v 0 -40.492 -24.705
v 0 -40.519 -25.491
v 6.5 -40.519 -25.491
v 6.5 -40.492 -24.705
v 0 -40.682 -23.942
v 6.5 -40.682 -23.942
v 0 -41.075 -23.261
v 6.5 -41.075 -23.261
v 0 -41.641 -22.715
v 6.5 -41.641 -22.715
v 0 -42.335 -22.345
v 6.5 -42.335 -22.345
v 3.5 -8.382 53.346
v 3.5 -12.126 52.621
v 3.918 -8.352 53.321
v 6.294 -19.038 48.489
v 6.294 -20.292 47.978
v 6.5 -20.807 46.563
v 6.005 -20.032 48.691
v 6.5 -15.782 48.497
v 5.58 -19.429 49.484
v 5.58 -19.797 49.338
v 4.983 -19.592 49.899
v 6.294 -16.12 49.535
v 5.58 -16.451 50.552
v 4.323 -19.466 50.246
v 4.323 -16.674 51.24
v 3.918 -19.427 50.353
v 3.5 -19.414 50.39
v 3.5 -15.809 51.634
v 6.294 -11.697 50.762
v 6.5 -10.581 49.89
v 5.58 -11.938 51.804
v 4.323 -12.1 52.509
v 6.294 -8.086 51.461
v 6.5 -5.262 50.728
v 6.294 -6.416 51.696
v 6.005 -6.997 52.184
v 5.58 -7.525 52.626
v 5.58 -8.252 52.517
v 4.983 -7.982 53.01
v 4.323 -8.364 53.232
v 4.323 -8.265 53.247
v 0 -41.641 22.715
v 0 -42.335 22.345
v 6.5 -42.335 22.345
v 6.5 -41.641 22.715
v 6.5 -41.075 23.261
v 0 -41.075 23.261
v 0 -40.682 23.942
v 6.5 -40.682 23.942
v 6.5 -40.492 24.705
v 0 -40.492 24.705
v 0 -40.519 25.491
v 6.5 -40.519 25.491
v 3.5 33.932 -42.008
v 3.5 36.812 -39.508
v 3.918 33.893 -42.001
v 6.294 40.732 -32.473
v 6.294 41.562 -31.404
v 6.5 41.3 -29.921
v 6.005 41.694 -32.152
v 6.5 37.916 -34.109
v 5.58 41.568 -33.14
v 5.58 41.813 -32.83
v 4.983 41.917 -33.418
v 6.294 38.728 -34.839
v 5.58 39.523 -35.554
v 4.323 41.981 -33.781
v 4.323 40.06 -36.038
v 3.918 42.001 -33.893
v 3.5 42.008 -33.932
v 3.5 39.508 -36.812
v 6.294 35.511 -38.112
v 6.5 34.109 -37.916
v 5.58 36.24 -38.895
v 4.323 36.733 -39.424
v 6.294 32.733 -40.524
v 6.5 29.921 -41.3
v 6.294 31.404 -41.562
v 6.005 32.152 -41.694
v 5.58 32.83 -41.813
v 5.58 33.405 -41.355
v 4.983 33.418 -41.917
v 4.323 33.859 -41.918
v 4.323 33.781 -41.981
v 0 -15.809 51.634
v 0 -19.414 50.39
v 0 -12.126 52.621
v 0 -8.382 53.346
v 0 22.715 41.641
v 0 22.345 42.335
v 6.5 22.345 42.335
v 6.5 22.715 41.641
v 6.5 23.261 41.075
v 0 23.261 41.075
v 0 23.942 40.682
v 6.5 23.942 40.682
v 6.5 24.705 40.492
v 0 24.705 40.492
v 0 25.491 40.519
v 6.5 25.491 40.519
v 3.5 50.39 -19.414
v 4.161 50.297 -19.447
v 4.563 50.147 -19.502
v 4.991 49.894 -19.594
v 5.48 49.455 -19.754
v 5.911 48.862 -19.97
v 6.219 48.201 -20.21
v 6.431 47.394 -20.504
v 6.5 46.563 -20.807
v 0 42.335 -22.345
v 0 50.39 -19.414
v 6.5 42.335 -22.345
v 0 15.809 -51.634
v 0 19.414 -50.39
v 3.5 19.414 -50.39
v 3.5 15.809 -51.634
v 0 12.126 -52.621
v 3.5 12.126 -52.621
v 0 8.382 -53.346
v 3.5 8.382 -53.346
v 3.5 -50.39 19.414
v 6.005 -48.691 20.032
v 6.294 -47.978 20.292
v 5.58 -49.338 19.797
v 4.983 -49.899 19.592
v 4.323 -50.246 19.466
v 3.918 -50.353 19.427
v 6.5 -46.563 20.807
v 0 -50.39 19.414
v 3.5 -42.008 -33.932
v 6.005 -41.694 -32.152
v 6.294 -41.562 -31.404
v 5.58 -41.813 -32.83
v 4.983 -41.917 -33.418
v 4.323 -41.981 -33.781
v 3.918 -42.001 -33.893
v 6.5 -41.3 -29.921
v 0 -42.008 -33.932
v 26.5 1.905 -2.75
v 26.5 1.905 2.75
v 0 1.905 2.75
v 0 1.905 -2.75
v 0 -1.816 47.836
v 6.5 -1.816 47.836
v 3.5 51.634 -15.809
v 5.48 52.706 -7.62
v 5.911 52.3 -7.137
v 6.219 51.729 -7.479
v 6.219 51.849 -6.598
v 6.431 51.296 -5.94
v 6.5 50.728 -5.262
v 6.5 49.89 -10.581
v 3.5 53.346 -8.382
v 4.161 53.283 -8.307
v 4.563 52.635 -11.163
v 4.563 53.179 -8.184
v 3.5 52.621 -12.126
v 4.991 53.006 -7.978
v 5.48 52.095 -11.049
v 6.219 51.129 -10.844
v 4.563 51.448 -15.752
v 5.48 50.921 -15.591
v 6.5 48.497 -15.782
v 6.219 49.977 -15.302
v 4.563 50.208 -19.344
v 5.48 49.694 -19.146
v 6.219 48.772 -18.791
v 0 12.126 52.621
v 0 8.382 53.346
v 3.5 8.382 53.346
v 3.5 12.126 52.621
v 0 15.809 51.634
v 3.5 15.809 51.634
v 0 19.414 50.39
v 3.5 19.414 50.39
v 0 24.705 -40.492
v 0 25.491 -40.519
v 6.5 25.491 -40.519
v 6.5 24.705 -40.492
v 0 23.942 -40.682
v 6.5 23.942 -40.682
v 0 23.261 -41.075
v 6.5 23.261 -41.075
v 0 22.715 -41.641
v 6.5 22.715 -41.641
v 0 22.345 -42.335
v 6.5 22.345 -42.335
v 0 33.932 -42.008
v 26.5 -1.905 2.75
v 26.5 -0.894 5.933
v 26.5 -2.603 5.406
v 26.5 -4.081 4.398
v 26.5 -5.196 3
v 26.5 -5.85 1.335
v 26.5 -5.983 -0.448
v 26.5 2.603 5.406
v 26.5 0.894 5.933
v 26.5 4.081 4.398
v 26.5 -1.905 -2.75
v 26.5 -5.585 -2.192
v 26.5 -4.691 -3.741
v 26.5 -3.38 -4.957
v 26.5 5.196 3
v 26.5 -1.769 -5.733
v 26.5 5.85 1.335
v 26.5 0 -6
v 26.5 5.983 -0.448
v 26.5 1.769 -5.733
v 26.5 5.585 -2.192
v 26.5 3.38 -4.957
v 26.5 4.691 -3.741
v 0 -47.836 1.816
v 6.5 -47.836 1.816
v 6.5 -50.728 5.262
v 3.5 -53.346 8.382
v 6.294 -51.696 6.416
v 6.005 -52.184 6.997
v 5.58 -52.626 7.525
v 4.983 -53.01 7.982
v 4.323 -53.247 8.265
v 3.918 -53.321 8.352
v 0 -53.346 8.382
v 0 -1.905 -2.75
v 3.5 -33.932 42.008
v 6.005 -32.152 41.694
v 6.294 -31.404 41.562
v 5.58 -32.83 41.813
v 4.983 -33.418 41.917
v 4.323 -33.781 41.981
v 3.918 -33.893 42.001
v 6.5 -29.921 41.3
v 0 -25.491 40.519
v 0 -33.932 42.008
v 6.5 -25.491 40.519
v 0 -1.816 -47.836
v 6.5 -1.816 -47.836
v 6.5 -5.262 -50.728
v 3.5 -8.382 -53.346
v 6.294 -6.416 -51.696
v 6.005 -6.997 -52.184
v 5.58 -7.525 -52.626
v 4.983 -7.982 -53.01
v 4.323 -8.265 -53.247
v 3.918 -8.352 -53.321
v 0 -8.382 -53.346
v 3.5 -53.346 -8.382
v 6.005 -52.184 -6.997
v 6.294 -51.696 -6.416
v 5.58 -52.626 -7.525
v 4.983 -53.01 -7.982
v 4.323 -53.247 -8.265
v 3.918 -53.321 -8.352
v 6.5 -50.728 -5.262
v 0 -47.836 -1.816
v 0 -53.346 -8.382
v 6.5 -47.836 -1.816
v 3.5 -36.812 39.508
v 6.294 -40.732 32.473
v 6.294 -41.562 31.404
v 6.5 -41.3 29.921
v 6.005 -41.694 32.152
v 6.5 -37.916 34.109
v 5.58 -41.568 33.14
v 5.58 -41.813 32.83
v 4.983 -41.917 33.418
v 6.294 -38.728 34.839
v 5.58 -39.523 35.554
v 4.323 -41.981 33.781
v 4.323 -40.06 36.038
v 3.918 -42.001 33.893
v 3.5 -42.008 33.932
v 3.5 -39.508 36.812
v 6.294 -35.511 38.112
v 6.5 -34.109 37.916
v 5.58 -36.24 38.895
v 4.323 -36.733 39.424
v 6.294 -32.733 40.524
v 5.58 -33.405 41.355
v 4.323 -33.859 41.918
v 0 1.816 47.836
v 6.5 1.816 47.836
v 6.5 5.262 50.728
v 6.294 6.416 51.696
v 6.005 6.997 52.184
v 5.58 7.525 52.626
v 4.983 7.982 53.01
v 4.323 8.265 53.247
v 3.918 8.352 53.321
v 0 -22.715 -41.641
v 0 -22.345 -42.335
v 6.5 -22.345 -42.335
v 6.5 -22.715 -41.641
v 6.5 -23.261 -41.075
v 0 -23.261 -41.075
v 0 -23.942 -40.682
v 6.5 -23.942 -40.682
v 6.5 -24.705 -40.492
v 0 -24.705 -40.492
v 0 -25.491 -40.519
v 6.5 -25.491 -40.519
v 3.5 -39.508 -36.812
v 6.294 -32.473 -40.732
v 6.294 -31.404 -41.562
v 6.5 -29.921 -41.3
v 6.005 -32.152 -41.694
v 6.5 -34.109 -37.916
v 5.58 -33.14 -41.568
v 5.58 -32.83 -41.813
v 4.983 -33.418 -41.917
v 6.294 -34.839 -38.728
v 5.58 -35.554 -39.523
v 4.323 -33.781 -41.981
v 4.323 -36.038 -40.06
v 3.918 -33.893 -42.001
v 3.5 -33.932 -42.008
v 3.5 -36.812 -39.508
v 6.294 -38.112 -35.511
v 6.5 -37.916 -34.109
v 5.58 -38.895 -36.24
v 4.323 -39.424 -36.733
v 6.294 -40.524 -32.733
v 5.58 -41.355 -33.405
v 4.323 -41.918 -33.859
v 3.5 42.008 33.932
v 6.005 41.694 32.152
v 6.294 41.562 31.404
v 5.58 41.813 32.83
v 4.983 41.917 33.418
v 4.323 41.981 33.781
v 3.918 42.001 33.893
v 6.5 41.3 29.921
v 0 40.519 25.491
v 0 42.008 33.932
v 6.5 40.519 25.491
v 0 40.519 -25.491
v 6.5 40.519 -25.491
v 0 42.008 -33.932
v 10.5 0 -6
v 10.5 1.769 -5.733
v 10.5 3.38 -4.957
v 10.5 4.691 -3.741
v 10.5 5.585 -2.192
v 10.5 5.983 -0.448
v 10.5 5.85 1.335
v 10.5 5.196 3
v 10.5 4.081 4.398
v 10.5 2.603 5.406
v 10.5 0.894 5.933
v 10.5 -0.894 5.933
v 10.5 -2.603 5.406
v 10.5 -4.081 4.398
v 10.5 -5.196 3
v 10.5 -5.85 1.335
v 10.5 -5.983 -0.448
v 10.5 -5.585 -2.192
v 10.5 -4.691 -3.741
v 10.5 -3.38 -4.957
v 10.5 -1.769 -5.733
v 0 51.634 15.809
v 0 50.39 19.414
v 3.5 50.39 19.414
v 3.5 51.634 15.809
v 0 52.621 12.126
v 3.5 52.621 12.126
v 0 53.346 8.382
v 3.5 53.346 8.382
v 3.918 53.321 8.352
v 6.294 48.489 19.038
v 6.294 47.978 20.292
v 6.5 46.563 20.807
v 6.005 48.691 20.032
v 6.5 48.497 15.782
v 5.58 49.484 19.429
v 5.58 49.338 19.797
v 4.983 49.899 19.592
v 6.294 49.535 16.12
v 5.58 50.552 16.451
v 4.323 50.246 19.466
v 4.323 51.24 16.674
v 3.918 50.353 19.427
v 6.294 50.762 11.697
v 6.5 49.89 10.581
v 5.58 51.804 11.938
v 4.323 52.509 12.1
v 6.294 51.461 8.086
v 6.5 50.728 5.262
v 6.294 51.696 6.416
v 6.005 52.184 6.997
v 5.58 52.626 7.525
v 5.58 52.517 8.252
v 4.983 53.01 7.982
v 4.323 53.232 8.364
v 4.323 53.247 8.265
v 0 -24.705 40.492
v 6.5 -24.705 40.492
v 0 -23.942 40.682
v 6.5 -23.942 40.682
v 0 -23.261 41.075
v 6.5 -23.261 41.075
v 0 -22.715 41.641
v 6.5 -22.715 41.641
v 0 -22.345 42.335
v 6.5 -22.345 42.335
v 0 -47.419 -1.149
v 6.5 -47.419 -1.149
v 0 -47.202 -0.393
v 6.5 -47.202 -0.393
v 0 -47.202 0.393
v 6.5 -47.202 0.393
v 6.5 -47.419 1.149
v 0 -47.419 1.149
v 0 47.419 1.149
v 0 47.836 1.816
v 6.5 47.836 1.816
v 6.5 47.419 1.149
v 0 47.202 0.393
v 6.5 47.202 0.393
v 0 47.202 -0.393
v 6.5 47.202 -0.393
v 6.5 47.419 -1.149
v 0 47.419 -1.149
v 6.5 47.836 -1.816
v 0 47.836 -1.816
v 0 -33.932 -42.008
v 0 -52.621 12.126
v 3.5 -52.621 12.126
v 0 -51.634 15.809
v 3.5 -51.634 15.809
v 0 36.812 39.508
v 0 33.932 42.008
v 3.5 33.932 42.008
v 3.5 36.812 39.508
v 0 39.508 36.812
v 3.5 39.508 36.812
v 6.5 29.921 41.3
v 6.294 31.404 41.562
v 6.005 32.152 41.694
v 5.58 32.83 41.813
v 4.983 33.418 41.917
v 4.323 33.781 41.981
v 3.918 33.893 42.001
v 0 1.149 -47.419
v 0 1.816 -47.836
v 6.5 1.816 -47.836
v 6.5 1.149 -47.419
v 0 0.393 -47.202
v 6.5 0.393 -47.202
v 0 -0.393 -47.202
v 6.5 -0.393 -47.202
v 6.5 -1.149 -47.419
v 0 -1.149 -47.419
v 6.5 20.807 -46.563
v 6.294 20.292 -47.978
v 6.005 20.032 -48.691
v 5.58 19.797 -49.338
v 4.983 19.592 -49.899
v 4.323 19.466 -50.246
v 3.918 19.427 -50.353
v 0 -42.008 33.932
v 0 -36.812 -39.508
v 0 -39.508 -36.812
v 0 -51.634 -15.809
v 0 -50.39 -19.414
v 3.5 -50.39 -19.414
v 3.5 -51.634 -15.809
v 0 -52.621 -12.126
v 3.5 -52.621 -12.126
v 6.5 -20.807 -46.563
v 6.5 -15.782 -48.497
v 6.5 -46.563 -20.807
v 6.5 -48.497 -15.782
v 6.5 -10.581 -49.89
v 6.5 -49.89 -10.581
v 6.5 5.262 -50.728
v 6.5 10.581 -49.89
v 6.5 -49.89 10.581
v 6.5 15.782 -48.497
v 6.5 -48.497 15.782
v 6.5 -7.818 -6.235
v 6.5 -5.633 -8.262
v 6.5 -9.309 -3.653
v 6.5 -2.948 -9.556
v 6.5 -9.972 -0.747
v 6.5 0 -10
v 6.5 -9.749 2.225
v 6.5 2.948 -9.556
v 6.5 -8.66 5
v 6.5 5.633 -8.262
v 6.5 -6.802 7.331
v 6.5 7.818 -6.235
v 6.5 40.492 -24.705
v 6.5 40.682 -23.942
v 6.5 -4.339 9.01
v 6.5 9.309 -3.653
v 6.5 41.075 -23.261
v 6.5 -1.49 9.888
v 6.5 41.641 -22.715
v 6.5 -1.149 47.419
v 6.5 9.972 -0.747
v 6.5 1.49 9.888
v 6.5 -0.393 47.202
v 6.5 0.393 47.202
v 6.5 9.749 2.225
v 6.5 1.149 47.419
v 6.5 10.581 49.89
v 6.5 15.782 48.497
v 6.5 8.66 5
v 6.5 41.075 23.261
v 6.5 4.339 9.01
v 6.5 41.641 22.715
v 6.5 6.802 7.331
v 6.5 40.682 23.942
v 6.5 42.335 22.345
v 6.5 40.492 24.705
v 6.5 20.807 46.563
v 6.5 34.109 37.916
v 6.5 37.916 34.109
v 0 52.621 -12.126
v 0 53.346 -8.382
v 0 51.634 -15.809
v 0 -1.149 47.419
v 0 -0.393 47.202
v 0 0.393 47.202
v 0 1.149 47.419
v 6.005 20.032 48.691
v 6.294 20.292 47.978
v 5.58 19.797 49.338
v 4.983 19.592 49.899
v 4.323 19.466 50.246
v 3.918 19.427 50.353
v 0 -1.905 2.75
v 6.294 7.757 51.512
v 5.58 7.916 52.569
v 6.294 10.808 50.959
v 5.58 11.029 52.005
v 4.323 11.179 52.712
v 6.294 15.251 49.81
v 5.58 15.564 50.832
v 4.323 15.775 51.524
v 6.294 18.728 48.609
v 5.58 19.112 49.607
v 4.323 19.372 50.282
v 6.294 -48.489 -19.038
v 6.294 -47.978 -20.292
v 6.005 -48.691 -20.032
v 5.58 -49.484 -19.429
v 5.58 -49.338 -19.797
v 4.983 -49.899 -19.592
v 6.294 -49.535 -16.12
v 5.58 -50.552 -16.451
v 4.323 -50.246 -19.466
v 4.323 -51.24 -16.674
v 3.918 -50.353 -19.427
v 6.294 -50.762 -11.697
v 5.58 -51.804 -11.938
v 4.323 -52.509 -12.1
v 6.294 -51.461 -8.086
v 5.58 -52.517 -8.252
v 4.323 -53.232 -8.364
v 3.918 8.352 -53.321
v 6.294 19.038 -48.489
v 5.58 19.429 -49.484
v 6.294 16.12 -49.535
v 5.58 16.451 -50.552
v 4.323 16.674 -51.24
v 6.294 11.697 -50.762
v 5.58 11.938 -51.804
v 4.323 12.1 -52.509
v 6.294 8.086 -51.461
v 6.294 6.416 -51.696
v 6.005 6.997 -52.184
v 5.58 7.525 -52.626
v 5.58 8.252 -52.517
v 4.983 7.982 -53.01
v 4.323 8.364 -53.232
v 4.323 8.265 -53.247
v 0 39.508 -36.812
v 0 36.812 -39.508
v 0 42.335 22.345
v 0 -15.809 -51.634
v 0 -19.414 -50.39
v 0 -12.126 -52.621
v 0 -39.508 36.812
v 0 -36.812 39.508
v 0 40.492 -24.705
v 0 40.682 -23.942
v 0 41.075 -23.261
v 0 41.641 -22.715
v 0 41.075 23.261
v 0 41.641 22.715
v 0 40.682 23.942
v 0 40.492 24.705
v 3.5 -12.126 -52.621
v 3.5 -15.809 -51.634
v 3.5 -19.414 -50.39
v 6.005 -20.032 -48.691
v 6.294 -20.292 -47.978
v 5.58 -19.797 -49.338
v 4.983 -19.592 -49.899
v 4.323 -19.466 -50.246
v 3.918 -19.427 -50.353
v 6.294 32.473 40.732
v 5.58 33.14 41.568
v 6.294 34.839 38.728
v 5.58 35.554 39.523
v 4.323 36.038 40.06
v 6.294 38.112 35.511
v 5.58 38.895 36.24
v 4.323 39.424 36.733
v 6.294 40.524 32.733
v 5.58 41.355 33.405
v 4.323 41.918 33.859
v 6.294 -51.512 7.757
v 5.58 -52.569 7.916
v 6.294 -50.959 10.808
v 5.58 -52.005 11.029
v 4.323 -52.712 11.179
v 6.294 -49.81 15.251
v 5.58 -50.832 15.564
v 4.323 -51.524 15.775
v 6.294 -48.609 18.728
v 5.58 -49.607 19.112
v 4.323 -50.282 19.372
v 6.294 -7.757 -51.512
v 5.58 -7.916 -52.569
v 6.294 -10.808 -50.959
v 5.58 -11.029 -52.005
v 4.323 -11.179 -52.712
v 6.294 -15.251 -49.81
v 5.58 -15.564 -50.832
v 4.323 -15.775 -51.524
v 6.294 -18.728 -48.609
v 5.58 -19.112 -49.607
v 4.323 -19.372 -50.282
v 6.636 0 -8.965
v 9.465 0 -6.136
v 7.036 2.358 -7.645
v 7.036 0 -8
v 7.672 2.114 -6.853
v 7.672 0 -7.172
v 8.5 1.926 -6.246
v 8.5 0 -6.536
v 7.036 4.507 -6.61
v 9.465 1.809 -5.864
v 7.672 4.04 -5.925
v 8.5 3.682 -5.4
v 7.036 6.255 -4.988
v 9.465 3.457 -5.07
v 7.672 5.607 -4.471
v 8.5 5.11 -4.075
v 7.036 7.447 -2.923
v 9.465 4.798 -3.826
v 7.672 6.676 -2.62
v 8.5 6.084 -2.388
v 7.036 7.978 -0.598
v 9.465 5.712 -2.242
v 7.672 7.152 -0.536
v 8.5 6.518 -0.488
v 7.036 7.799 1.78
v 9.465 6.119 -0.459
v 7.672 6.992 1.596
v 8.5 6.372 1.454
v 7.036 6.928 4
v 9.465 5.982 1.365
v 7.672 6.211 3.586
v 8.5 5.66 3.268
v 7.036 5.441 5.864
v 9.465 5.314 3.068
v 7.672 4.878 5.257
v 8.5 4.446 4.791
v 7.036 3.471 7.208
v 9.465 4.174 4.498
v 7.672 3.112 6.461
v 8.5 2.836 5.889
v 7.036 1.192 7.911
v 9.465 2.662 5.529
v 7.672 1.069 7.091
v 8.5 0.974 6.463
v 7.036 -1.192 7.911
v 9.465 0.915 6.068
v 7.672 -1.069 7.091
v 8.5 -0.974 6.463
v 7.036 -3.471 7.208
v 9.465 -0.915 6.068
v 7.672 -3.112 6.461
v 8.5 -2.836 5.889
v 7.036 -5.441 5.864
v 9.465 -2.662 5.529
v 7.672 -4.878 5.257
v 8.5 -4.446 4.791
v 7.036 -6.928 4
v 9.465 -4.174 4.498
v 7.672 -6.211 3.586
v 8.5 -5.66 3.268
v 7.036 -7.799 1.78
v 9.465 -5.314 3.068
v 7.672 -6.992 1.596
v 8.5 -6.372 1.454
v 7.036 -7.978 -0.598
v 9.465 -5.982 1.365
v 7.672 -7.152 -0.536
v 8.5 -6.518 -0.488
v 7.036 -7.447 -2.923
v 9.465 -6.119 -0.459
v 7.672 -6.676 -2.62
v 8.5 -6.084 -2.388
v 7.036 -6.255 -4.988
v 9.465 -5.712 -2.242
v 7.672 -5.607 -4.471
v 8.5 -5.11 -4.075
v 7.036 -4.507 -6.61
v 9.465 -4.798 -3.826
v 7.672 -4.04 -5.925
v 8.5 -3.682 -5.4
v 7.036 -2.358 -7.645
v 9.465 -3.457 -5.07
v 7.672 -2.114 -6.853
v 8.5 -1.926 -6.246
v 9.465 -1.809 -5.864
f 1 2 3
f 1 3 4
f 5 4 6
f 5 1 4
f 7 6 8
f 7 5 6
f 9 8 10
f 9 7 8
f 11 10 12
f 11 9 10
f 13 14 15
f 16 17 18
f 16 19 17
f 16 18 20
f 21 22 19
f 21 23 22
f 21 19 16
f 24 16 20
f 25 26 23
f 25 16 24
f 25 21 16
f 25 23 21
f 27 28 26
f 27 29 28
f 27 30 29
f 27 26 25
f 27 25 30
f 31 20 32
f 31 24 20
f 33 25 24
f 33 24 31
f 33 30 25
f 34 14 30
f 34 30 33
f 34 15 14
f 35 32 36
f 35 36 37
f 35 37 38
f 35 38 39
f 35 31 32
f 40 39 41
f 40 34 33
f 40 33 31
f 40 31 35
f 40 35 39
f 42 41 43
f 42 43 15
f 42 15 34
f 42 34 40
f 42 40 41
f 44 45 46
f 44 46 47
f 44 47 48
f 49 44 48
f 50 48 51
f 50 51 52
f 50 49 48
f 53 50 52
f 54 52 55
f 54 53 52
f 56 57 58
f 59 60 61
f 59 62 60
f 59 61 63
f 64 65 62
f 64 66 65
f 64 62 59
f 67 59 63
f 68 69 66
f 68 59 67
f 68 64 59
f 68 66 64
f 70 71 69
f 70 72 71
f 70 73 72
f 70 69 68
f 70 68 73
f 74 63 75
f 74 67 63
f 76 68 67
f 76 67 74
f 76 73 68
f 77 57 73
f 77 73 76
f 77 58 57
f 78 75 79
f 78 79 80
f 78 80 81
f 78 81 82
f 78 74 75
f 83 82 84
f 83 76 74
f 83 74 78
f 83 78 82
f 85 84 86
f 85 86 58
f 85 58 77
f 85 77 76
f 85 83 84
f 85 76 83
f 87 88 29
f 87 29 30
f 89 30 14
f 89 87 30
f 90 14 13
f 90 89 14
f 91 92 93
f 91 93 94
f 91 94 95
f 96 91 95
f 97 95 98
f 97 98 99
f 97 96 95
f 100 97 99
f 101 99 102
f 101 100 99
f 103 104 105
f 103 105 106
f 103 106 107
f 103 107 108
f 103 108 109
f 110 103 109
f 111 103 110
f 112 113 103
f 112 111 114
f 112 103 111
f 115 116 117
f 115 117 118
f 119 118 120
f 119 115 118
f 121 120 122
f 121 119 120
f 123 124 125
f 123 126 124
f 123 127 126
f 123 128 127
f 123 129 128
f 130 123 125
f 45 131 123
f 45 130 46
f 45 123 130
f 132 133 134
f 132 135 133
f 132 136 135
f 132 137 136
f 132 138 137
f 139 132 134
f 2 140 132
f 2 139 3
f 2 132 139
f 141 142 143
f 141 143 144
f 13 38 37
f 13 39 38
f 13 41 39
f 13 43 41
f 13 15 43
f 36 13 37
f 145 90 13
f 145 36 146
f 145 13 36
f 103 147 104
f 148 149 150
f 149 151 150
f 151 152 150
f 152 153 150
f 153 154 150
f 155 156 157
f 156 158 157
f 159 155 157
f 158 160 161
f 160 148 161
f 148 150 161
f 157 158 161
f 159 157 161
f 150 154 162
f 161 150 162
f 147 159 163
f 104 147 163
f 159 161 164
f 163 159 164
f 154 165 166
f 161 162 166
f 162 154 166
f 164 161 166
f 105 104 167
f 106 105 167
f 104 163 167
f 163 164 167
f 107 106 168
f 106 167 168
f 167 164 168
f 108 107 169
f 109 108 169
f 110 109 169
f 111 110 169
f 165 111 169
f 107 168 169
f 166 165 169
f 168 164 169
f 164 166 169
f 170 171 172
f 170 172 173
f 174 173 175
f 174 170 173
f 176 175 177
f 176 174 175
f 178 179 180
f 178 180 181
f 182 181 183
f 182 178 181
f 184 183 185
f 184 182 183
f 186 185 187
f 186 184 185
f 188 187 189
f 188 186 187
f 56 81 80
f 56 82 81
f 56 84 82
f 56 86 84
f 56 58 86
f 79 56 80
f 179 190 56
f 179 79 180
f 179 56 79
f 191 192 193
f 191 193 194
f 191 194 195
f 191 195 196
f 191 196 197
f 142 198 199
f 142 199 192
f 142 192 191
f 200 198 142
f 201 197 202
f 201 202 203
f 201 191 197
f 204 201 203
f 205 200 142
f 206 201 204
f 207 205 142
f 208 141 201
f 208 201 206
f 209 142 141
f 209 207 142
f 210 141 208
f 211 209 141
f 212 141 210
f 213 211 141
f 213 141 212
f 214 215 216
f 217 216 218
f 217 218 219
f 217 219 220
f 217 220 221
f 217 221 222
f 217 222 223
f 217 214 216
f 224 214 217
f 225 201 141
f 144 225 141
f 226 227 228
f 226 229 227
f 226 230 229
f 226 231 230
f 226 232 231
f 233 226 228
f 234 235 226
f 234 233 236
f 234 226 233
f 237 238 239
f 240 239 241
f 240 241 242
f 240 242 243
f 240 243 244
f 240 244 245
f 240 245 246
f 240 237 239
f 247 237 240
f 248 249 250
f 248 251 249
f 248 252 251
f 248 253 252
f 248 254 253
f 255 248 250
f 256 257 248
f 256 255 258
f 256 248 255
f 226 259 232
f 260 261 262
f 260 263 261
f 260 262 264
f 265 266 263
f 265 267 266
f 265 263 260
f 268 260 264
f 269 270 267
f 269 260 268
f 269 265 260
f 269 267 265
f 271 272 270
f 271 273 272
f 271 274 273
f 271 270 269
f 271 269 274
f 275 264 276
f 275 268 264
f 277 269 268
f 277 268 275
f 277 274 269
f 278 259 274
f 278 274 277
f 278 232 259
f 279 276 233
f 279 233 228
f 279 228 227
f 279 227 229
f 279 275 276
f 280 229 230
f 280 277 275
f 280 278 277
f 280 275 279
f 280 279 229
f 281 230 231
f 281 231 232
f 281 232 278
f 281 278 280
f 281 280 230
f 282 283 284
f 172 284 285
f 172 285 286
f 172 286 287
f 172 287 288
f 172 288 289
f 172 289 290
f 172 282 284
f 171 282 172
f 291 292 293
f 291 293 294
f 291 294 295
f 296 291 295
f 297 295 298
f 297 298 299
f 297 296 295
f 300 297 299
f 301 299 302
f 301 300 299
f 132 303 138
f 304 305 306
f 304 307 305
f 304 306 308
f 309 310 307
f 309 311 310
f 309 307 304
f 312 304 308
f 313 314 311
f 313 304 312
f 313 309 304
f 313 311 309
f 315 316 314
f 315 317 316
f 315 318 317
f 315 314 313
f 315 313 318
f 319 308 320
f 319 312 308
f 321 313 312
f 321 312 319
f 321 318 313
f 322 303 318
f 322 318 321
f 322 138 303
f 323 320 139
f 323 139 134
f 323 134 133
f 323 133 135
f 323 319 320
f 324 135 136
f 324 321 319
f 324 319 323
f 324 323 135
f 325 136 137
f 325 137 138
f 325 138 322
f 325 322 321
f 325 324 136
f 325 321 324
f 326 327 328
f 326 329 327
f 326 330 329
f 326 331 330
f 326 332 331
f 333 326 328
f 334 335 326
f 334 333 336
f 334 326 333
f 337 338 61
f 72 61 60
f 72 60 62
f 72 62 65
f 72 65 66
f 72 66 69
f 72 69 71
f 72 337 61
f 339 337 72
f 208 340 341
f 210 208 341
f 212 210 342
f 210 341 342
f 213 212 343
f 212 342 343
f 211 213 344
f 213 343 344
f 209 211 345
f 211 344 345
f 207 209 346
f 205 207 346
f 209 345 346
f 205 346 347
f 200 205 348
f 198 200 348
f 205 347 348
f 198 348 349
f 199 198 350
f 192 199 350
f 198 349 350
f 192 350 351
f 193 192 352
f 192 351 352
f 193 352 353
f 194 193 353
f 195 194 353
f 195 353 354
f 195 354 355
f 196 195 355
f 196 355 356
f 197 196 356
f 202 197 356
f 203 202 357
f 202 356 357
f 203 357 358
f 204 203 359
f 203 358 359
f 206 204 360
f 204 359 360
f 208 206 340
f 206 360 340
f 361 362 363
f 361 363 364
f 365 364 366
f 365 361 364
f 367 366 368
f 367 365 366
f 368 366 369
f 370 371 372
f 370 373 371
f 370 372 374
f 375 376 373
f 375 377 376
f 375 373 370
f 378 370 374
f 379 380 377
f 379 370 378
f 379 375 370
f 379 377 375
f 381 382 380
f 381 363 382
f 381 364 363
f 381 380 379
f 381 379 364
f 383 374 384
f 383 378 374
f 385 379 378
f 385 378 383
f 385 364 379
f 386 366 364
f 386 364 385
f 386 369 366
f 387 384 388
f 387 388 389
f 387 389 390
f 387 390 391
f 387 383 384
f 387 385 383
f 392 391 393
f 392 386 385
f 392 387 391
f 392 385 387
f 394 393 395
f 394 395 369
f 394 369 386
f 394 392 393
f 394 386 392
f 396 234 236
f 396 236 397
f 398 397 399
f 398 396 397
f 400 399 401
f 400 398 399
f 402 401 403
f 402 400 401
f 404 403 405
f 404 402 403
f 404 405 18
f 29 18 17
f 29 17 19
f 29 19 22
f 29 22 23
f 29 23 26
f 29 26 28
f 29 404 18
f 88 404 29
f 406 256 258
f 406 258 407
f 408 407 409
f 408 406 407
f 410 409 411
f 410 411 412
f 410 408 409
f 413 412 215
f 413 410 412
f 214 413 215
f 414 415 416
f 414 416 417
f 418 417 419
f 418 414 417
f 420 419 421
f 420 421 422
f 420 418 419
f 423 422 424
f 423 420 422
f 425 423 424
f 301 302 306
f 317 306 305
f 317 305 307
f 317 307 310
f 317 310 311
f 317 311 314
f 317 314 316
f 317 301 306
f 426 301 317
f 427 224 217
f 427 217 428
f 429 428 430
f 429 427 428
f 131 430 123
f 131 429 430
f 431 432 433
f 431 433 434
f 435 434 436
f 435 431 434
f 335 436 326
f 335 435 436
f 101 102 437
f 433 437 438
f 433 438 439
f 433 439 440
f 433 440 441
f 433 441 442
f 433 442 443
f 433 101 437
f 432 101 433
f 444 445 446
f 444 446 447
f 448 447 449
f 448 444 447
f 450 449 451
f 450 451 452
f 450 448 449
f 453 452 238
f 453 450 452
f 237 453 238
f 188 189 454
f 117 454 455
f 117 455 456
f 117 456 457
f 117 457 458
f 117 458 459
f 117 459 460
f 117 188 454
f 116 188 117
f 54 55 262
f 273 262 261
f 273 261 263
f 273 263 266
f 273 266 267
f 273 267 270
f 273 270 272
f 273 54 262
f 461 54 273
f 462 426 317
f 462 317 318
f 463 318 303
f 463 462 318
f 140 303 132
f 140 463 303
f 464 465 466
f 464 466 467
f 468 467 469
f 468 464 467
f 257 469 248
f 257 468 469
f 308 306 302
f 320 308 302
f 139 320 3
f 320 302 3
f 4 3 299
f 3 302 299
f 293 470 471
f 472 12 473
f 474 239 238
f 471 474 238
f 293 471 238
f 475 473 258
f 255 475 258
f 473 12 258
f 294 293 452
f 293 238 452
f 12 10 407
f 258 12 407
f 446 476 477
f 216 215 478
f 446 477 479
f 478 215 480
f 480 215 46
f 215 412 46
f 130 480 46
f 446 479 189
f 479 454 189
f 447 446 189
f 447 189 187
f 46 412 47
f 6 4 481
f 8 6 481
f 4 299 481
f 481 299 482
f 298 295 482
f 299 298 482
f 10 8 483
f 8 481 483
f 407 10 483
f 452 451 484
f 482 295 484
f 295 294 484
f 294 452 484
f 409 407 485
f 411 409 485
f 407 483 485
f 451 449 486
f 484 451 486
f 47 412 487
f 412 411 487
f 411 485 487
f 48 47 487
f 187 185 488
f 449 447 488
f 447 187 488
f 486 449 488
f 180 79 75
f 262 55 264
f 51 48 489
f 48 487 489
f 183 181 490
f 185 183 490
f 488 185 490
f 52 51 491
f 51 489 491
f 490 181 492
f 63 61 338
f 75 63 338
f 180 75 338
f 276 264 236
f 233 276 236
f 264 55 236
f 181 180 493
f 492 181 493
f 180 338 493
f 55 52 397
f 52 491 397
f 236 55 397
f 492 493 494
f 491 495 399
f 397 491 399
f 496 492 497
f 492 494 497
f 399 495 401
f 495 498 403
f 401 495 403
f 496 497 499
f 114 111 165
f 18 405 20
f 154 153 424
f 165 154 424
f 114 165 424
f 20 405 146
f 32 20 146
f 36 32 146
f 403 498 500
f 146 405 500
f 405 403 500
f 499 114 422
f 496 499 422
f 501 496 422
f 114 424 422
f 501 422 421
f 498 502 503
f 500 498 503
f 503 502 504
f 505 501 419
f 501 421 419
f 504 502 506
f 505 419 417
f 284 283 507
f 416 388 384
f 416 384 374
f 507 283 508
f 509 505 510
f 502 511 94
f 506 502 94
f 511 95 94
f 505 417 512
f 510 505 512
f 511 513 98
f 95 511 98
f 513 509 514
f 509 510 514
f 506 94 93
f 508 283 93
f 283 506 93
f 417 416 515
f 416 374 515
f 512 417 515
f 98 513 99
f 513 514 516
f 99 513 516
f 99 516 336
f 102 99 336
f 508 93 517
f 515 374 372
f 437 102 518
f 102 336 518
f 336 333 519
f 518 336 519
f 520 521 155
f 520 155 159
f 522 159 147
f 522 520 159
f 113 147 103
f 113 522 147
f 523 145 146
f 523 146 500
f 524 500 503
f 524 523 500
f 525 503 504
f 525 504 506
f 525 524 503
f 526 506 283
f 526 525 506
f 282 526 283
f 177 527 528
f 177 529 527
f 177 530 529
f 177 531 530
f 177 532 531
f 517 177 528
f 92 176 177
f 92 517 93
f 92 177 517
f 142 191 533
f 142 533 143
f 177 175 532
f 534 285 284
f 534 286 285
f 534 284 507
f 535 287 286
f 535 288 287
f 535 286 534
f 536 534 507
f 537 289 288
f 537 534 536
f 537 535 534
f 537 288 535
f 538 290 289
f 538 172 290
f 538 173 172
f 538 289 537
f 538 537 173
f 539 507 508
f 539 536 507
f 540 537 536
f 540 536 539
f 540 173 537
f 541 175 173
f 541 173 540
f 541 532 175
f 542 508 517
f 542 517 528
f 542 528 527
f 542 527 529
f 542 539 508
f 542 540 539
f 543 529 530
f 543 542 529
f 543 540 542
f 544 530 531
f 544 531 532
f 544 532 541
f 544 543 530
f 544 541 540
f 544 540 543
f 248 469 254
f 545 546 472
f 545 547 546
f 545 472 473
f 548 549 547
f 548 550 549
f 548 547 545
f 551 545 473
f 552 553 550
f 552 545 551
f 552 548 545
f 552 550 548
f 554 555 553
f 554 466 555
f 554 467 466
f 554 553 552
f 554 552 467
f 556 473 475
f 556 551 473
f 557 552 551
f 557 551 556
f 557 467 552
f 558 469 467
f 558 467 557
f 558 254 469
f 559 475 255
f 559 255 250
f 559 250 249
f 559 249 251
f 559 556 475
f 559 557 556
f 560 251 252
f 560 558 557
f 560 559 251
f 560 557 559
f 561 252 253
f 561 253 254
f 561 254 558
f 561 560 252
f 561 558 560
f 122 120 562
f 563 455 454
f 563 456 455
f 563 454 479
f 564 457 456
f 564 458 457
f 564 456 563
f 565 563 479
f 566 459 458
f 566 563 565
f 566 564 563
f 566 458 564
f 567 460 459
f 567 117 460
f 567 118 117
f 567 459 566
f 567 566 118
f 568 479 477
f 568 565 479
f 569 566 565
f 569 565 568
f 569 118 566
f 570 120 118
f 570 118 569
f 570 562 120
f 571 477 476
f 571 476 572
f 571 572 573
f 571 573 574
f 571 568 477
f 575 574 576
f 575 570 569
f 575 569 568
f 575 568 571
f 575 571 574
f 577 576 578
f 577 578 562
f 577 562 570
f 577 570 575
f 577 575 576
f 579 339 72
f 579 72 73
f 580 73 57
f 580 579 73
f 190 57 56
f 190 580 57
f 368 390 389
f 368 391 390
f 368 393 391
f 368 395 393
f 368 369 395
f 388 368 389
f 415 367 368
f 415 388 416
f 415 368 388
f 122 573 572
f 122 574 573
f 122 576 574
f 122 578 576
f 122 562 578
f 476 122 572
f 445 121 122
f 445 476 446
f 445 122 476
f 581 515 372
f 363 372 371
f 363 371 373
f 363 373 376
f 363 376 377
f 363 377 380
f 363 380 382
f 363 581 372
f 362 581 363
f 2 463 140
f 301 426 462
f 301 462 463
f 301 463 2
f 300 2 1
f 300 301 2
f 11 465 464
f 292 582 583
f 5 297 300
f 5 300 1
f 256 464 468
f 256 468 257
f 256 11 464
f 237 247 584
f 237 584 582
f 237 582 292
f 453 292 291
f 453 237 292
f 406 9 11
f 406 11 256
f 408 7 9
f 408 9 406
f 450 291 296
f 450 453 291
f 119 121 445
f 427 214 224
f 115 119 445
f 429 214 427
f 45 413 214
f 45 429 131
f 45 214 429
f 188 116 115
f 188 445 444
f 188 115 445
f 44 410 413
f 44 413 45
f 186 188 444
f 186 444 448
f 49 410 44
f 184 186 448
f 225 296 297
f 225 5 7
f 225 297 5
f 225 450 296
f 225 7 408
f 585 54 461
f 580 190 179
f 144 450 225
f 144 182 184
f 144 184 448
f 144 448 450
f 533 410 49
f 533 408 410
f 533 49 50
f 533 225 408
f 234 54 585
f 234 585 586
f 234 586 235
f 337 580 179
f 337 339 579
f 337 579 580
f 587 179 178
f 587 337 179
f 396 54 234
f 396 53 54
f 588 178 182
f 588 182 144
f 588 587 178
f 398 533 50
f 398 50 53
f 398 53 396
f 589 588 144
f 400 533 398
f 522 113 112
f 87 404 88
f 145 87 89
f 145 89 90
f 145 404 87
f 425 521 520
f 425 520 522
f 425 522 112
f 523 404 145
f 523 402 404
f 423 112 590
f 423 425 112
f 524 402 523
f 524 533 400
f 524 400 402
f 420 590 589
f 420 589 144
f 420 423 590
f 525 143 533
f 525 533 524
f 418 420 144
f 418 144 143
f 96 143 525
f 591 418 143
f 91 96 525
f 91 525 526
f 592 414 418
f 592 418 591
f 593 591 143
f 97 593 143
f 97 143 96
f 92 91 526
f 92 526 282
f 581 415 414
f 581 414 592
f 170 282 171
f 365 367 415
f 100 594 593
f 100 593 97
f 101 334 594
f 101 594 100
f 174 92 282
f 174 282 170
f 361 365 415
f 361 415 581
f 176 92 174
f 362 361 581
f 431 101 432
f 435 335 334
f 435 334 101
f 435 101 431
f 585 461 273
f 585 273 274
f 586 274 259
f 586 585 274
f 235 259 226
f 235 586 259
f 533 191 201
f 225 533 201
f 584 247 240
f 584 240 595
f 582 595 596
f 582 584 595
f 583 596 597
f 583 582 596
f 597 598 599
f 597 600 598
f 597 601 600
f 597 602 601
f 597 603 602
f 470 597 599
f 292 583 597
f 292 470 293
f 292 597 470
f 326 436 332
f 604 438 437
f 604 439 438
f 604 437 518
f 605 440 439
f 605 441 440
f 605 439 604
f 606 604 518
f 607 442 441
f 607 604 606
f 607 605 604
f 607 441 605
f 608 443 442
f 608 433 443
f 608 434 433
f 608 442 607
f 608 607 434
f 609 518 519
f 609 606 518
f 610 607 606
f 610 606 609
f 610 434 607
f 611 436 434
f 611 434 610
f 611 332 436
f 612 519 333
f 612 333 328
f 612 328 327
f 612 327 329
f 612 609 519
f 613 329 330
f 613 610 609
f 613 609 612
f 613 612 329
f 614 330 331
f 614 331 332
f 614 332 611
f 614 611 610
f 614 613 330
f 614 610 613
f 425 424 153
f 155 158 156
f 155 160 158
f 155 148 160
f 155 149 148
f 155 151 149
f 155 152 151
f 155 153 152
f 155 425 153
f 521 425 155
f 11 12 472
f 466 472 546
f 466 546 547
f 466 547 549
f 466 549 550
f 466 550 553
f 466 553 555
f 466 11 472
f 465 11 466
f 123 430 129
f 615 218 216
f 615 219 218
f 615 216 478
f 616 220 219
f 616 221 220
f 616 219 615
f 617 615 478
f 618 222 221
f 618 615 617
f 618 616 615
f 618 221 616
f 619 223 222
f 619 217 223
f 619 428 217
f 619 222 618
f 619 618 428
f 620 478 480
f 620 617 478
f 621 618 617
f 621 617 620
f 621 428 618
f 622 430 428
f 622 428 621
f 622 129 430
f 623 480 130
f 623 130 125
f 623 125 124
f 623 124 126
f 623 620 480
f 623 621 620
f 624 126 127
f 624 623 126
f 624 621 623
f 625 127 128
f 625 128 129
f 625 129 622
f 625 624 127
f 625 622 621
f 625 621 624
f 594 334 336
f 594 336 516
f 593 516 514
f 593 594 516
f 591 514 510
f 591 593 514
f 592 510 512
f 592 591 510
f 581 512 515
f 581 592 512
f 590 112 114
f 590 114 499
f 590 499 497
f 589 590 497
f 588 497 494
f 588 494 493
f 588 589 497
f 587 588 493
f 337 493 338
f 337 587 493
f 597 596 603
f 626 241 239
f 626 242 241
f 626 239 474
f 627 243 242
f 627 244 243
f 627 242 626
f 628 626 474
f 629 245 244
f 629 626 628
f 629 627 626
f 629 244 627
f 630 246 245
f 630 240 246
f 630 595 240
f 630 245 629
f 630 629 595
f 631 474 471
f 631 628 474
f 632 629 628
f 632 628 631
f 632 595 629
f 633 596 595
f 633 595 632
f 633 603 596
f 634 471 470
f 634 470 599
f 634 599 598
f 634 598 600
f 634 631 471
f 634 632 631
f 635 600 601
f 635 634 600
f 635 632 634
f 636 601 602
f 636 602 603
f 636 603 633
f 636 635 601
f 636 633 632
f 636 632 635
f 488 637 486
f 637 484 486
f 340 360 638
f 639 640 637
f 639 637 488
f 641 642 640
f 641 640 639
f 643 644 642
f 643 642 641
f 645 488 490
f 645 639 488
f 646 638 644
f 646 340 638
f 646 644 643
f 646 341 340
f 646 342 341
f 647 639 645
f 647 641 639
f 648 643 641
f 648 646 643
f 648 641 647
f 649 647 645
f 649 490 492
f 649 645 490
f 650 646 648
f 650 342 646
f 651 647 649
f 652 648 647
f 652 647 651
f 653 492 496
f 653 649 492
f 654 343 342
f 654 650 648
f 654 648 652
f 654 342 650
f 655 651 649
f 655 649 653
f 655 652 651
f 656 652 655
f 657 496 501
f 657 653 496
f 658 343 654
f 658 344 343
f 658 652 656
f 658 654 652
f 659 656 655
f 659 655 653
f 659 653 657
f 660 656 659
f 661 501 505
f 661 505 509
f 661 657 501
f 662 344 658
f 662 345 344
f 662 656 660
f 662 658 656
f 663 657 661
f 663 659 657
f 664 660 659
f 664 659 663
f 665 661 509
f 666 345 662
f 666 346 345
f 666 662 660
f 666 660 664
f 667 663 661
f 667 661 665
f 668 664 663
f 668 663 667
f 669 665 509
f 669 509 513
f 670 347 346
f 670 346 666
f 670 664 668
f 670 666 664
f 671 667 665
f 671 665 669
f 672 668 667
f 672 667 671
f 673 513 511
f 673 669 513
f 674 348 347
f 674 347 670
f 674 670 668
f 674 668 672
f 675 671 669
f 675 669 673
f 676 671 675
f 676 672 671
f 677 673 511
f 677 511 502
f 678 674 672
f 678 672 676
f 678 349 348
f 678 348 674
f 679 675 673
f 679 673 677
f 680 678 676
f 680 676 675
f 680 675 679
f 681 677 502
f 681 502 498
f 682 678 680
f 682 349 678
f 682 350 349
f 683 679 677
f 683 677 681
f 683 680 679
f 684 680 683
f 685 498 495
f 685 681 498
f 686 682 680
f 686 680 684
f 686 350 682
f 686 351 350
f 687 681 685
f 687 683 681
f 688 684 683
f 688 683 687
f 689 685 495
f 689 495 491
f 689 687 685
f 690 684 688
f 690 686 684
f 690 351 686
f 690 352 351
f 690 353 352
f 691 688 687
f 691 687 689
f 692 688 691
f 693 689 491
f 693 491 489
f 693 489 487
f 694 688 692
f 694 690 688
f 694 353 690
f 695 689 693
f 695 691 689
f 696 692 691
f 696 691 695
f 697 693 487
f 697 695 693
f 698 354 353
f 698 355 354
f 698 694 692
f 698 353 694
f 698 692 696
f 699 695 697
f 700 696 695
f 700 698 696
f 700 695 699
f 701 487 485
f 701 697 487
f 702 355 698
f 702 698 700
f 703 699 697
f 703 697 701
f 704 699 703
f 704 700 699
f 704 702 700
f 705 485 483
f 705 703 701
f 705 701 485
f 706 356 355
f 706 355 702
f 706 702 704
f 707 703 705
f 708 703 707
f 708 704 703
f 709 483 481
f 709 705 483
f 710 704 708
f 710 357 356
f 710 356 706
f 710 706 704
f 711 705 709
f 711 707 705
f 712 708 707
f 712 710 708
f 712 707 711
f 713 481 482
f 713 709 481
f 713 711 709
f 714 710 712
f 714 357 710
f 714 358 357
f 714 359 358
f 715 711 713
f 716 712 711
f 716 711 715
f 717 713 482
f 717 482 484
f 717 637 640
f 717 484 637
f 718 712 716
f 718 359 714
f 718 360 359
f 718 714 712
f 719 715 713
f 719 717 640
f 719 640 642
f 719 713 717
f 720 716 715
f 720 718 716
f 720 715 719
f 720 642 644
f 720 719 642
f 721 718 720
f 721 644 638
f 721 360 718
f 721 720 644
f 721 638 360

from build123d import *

# Parameters (mm, degrees)
BOSS_EXTRUDE1_DEPTH = 6.5
SKETCH2_R           = 6
BOSS_EXTRUDE2_DEPTH = 20
FILLET1_R           = 3
SKETCH3_W           = 5.5
SKETCH3_H           = 3.81
CUT_EXTRUDE1_DEPTH  = 27.5000001
FILLET2_R           = 4


with BuildPart() as part:
    # Sketch1 → Boss-Extrude1 (new body)
    with BuildSketch(Plane(origin=(0, 0, 0), x_dir=(0, 0, -1), z_dir=(1, 0, 0))):
        with BuildLine():
            Line((1.815874997, 47.835924448), (8.381939498, 53.345506749))
            ThreePointArc((8.381939498, 53.345506749), (13.976228436, 52.15999462), (19.413780836, 50.389533771))
            Line((19.413780836, 50.389533771), (22.345368346, 42.335063284))
            ThreePointArc((22.345368346, 42.335063284), (23.5875, 40.854748424), (25.490556102, 40.519188287))
            Line((25.490556102, 40.519188287), (33.931725912, 42.007594273))
            ThreePointArc((33.931725912, 42.007594273), (38.183766184, 38.183766184), (42.007594273, 33.931725912))
            Line((42.007594273, 33.931725912), (40.519188287, 25.490556102))
            ThreePointArc((40.519188287, 25.490556102), (40.854748424, 23.5875), (42.335063284, 22.345368346))
            Line((42.335063284, 22.345368346), (50.389533771, 19.413780836))
            ThreePointArc((50.389533771, 19.413780836), (52.15999462, 13.976228436), (53.345506749, 8.381939498))
            Line((53.345506749, 8.381939498), (47.835924448, 1.815874997))
            ThreePointArc((47.835924448, 1.815874997), (47.175, 0), (47.835924448, -1.815874997))
            Line((47.835924448, -1.815874997), (53.345506749, -8.381939498))
            ThreePointArc((53.345506749, -8.381939498), (52.15999462, -13.976228436), (50.389533771, -19.413780836))
            Line((50.389533771, -19.413780836), (42.335063284, -22.345368346))
            ThreePointArc((42.335063284, -22.345368346), (40.854748424, -23.5875), (40.519188287, -25.490556102))
            Line((40.519188287, -25.490556102), (42.007594273, -33.931725912))
            ThreePointArc((42.007594273, -33.931725912), (38.183766184, -38.183766184), (33.931725912, -42.007594273))
            Line((33.931725912, -42.007594273), (25.490556102, -40.519188287))
            ThreePointArc((25.490556102, -40.519188287), (23.5875, -40.854748424), (22.345368346, -42.335063284))
            Line((22.345368346, -42.335063284), (19.413780836, -50.389533771))
            ThreePointArc((19.413780836, -50.389533771), (13.976228436, -52.15999462), (8.381939498, -53.345506749))
            Line((8.381939498, -53.345506749), (1.815874997, -47.835924448))
            ThreePointArc((1.815874997, -47.835924448), (0, -47.175), (-1.815874997, -47.835924448))
            Line((-1.815874997, -47.835924448), (-8.381939498, -53.345506749))
            ThreePointArc((-8.381939498, -53.345506749), (-13.976228436, -52.15999462), (-19.413780836, -50.389533771))
            Line((-19.413780836, -50.389533771), (-22.345368346, -42.335063284))
            ThreePointArc((-22.345368346, -42.335063284), (-23.5875, -40.854748424), (-25.490556102, -40.519188287))
            Line((-25.490556102, -40.519188287), (-33.931725912, -42.007594273))
            ThreePointArc((-33.931725912, -42.007594273), (-38.183766184, -38.183766184), (-42.007594273, -33.931725912))
            Line((-42.007594273, -33.931725912), (-40.519188287, -25.490556102))
            ThreePointArc((-40.519188287, -25.490556102), (-40.854748424, -23.5875), (-42.335063284, -22.345368346))
            Line((-42.335063284, -22.345368346), (-50.389533771, -19.413780836))
            ThreePointArc((-50.389533771, -19.413780836), (-52.15999462, -13.976228436), (-53.345506749, -8.381939498))
            Line((-53.345506749, -8.381939498), (-47.835924448, -1.815874997))
            ThreePointArc((-47.835924448, -1.815874997), (-47.175, 0), (-47.835924448, 1.815874997))
            Line((-47.835924448, 1.815874997), (-53.345506749, 8.381939498))
            ThreePointArc((-53.345506749, 8.381939498), (-52.15999462, 13.976228436), (-50.389533771, 19.413780836))
            Line((-50.389533771, 19.413780836), (-42.335063284, 22.345368346))
            ThreePointArc((-42.335063284, 22.345368346), (-40.854748424, 23.5875), (-40.519188287, 25.490556102))
            Line((-40.519188287, 25.490556102), (-42.007594273, 33.931725912))
            ThreePointArc((-42.007594273, 33.931725912), (-38.183766184, 38.183766184), (-33.931725912, 42.007594273))
            Line((-33.931725912, 42.007594273), (-25.490556102, 40.519188287))
            ThreePointArc((-25.490556102, 40.519188287), (-23.5875, 40.854748424), (-22.345368346, 42.335063284))
            Line((-22.345368346, 42.335063284), (-19.413780836, 50.389533771))
            ThreePointArc((-19.413780836, 50.389533771), (-13.976228436, 52.15999462), (-8.381939498, 53.345506749))
            Line((-8.381939498, 53.345506749), (-1.815874997, 47.835924448))
            ThreePointArc((-1.815874997, 47.835924448), (0, 47.175), (1.815874997, 47.835924448))
        make_face()
    extrude(amount=BOSS_EXTRUDE1_DEPTH)

    # Sketch2 → Boss-Extrude2 (add)
    with BuildSketch(Plane(origin=(6.5, 0, 0), x_dir=(0, 0, -1), z_dir=(1, 0, 0))):
        Circle(SKETCH2_R)
    extrude(amount=BOSS_EXTRUDE2_DEPTH)

    # Fillet1
    fillet1_edges = [part.edges().sort_by_distance(p)[0] for p in [
        (6.5, -52.15999462, 13.976228436),
        (6.5, -52.15999462, -13.976228436),
        (6.5, 52.15999462, -13.976228436),
        (6.5, -38.183766184, -38.183766184),
        (6.5, -13.976228436, -52.15999462),
        (6.5, 13.976228436, -52.15999462),
        (6.5, 38.183766184, -38.183766184),
        (6.5, 52.15999462, 13.976228436),
        (6.5, 38.183766184, 38.183766184),
        (6.5, 13.976228436, 52.15999462),
        (6.5, -13.976228436, 52.15999462),
        (6.5, -38.183766184, 38.183766184),
    ]]
    fillet(fillet1_edges, radius=FILLET1_R)

    # Sketch3 → Cut-Extrude1 (cut, through all)
    with BuildSketch(Plane(origin=(26.5, 0, 0), x_dir=(0, 0, -1), z_dir=(1, 0, 0))):
        Rectangle(SKETCH3_W, SKETCH3_H)
    extrude(amount=-CUT_EXTRUDE1_DEPTH, mode=Mode.SUBTRACT)

    # Fillet2
    fillet2_edges = [part.edges().sort_by_distance(p)[0] for p in [
        (6.5, 0, 6),
    ]]
    fillet(fillet2_edges, radius=FILLET2_R)


solid = part.part
